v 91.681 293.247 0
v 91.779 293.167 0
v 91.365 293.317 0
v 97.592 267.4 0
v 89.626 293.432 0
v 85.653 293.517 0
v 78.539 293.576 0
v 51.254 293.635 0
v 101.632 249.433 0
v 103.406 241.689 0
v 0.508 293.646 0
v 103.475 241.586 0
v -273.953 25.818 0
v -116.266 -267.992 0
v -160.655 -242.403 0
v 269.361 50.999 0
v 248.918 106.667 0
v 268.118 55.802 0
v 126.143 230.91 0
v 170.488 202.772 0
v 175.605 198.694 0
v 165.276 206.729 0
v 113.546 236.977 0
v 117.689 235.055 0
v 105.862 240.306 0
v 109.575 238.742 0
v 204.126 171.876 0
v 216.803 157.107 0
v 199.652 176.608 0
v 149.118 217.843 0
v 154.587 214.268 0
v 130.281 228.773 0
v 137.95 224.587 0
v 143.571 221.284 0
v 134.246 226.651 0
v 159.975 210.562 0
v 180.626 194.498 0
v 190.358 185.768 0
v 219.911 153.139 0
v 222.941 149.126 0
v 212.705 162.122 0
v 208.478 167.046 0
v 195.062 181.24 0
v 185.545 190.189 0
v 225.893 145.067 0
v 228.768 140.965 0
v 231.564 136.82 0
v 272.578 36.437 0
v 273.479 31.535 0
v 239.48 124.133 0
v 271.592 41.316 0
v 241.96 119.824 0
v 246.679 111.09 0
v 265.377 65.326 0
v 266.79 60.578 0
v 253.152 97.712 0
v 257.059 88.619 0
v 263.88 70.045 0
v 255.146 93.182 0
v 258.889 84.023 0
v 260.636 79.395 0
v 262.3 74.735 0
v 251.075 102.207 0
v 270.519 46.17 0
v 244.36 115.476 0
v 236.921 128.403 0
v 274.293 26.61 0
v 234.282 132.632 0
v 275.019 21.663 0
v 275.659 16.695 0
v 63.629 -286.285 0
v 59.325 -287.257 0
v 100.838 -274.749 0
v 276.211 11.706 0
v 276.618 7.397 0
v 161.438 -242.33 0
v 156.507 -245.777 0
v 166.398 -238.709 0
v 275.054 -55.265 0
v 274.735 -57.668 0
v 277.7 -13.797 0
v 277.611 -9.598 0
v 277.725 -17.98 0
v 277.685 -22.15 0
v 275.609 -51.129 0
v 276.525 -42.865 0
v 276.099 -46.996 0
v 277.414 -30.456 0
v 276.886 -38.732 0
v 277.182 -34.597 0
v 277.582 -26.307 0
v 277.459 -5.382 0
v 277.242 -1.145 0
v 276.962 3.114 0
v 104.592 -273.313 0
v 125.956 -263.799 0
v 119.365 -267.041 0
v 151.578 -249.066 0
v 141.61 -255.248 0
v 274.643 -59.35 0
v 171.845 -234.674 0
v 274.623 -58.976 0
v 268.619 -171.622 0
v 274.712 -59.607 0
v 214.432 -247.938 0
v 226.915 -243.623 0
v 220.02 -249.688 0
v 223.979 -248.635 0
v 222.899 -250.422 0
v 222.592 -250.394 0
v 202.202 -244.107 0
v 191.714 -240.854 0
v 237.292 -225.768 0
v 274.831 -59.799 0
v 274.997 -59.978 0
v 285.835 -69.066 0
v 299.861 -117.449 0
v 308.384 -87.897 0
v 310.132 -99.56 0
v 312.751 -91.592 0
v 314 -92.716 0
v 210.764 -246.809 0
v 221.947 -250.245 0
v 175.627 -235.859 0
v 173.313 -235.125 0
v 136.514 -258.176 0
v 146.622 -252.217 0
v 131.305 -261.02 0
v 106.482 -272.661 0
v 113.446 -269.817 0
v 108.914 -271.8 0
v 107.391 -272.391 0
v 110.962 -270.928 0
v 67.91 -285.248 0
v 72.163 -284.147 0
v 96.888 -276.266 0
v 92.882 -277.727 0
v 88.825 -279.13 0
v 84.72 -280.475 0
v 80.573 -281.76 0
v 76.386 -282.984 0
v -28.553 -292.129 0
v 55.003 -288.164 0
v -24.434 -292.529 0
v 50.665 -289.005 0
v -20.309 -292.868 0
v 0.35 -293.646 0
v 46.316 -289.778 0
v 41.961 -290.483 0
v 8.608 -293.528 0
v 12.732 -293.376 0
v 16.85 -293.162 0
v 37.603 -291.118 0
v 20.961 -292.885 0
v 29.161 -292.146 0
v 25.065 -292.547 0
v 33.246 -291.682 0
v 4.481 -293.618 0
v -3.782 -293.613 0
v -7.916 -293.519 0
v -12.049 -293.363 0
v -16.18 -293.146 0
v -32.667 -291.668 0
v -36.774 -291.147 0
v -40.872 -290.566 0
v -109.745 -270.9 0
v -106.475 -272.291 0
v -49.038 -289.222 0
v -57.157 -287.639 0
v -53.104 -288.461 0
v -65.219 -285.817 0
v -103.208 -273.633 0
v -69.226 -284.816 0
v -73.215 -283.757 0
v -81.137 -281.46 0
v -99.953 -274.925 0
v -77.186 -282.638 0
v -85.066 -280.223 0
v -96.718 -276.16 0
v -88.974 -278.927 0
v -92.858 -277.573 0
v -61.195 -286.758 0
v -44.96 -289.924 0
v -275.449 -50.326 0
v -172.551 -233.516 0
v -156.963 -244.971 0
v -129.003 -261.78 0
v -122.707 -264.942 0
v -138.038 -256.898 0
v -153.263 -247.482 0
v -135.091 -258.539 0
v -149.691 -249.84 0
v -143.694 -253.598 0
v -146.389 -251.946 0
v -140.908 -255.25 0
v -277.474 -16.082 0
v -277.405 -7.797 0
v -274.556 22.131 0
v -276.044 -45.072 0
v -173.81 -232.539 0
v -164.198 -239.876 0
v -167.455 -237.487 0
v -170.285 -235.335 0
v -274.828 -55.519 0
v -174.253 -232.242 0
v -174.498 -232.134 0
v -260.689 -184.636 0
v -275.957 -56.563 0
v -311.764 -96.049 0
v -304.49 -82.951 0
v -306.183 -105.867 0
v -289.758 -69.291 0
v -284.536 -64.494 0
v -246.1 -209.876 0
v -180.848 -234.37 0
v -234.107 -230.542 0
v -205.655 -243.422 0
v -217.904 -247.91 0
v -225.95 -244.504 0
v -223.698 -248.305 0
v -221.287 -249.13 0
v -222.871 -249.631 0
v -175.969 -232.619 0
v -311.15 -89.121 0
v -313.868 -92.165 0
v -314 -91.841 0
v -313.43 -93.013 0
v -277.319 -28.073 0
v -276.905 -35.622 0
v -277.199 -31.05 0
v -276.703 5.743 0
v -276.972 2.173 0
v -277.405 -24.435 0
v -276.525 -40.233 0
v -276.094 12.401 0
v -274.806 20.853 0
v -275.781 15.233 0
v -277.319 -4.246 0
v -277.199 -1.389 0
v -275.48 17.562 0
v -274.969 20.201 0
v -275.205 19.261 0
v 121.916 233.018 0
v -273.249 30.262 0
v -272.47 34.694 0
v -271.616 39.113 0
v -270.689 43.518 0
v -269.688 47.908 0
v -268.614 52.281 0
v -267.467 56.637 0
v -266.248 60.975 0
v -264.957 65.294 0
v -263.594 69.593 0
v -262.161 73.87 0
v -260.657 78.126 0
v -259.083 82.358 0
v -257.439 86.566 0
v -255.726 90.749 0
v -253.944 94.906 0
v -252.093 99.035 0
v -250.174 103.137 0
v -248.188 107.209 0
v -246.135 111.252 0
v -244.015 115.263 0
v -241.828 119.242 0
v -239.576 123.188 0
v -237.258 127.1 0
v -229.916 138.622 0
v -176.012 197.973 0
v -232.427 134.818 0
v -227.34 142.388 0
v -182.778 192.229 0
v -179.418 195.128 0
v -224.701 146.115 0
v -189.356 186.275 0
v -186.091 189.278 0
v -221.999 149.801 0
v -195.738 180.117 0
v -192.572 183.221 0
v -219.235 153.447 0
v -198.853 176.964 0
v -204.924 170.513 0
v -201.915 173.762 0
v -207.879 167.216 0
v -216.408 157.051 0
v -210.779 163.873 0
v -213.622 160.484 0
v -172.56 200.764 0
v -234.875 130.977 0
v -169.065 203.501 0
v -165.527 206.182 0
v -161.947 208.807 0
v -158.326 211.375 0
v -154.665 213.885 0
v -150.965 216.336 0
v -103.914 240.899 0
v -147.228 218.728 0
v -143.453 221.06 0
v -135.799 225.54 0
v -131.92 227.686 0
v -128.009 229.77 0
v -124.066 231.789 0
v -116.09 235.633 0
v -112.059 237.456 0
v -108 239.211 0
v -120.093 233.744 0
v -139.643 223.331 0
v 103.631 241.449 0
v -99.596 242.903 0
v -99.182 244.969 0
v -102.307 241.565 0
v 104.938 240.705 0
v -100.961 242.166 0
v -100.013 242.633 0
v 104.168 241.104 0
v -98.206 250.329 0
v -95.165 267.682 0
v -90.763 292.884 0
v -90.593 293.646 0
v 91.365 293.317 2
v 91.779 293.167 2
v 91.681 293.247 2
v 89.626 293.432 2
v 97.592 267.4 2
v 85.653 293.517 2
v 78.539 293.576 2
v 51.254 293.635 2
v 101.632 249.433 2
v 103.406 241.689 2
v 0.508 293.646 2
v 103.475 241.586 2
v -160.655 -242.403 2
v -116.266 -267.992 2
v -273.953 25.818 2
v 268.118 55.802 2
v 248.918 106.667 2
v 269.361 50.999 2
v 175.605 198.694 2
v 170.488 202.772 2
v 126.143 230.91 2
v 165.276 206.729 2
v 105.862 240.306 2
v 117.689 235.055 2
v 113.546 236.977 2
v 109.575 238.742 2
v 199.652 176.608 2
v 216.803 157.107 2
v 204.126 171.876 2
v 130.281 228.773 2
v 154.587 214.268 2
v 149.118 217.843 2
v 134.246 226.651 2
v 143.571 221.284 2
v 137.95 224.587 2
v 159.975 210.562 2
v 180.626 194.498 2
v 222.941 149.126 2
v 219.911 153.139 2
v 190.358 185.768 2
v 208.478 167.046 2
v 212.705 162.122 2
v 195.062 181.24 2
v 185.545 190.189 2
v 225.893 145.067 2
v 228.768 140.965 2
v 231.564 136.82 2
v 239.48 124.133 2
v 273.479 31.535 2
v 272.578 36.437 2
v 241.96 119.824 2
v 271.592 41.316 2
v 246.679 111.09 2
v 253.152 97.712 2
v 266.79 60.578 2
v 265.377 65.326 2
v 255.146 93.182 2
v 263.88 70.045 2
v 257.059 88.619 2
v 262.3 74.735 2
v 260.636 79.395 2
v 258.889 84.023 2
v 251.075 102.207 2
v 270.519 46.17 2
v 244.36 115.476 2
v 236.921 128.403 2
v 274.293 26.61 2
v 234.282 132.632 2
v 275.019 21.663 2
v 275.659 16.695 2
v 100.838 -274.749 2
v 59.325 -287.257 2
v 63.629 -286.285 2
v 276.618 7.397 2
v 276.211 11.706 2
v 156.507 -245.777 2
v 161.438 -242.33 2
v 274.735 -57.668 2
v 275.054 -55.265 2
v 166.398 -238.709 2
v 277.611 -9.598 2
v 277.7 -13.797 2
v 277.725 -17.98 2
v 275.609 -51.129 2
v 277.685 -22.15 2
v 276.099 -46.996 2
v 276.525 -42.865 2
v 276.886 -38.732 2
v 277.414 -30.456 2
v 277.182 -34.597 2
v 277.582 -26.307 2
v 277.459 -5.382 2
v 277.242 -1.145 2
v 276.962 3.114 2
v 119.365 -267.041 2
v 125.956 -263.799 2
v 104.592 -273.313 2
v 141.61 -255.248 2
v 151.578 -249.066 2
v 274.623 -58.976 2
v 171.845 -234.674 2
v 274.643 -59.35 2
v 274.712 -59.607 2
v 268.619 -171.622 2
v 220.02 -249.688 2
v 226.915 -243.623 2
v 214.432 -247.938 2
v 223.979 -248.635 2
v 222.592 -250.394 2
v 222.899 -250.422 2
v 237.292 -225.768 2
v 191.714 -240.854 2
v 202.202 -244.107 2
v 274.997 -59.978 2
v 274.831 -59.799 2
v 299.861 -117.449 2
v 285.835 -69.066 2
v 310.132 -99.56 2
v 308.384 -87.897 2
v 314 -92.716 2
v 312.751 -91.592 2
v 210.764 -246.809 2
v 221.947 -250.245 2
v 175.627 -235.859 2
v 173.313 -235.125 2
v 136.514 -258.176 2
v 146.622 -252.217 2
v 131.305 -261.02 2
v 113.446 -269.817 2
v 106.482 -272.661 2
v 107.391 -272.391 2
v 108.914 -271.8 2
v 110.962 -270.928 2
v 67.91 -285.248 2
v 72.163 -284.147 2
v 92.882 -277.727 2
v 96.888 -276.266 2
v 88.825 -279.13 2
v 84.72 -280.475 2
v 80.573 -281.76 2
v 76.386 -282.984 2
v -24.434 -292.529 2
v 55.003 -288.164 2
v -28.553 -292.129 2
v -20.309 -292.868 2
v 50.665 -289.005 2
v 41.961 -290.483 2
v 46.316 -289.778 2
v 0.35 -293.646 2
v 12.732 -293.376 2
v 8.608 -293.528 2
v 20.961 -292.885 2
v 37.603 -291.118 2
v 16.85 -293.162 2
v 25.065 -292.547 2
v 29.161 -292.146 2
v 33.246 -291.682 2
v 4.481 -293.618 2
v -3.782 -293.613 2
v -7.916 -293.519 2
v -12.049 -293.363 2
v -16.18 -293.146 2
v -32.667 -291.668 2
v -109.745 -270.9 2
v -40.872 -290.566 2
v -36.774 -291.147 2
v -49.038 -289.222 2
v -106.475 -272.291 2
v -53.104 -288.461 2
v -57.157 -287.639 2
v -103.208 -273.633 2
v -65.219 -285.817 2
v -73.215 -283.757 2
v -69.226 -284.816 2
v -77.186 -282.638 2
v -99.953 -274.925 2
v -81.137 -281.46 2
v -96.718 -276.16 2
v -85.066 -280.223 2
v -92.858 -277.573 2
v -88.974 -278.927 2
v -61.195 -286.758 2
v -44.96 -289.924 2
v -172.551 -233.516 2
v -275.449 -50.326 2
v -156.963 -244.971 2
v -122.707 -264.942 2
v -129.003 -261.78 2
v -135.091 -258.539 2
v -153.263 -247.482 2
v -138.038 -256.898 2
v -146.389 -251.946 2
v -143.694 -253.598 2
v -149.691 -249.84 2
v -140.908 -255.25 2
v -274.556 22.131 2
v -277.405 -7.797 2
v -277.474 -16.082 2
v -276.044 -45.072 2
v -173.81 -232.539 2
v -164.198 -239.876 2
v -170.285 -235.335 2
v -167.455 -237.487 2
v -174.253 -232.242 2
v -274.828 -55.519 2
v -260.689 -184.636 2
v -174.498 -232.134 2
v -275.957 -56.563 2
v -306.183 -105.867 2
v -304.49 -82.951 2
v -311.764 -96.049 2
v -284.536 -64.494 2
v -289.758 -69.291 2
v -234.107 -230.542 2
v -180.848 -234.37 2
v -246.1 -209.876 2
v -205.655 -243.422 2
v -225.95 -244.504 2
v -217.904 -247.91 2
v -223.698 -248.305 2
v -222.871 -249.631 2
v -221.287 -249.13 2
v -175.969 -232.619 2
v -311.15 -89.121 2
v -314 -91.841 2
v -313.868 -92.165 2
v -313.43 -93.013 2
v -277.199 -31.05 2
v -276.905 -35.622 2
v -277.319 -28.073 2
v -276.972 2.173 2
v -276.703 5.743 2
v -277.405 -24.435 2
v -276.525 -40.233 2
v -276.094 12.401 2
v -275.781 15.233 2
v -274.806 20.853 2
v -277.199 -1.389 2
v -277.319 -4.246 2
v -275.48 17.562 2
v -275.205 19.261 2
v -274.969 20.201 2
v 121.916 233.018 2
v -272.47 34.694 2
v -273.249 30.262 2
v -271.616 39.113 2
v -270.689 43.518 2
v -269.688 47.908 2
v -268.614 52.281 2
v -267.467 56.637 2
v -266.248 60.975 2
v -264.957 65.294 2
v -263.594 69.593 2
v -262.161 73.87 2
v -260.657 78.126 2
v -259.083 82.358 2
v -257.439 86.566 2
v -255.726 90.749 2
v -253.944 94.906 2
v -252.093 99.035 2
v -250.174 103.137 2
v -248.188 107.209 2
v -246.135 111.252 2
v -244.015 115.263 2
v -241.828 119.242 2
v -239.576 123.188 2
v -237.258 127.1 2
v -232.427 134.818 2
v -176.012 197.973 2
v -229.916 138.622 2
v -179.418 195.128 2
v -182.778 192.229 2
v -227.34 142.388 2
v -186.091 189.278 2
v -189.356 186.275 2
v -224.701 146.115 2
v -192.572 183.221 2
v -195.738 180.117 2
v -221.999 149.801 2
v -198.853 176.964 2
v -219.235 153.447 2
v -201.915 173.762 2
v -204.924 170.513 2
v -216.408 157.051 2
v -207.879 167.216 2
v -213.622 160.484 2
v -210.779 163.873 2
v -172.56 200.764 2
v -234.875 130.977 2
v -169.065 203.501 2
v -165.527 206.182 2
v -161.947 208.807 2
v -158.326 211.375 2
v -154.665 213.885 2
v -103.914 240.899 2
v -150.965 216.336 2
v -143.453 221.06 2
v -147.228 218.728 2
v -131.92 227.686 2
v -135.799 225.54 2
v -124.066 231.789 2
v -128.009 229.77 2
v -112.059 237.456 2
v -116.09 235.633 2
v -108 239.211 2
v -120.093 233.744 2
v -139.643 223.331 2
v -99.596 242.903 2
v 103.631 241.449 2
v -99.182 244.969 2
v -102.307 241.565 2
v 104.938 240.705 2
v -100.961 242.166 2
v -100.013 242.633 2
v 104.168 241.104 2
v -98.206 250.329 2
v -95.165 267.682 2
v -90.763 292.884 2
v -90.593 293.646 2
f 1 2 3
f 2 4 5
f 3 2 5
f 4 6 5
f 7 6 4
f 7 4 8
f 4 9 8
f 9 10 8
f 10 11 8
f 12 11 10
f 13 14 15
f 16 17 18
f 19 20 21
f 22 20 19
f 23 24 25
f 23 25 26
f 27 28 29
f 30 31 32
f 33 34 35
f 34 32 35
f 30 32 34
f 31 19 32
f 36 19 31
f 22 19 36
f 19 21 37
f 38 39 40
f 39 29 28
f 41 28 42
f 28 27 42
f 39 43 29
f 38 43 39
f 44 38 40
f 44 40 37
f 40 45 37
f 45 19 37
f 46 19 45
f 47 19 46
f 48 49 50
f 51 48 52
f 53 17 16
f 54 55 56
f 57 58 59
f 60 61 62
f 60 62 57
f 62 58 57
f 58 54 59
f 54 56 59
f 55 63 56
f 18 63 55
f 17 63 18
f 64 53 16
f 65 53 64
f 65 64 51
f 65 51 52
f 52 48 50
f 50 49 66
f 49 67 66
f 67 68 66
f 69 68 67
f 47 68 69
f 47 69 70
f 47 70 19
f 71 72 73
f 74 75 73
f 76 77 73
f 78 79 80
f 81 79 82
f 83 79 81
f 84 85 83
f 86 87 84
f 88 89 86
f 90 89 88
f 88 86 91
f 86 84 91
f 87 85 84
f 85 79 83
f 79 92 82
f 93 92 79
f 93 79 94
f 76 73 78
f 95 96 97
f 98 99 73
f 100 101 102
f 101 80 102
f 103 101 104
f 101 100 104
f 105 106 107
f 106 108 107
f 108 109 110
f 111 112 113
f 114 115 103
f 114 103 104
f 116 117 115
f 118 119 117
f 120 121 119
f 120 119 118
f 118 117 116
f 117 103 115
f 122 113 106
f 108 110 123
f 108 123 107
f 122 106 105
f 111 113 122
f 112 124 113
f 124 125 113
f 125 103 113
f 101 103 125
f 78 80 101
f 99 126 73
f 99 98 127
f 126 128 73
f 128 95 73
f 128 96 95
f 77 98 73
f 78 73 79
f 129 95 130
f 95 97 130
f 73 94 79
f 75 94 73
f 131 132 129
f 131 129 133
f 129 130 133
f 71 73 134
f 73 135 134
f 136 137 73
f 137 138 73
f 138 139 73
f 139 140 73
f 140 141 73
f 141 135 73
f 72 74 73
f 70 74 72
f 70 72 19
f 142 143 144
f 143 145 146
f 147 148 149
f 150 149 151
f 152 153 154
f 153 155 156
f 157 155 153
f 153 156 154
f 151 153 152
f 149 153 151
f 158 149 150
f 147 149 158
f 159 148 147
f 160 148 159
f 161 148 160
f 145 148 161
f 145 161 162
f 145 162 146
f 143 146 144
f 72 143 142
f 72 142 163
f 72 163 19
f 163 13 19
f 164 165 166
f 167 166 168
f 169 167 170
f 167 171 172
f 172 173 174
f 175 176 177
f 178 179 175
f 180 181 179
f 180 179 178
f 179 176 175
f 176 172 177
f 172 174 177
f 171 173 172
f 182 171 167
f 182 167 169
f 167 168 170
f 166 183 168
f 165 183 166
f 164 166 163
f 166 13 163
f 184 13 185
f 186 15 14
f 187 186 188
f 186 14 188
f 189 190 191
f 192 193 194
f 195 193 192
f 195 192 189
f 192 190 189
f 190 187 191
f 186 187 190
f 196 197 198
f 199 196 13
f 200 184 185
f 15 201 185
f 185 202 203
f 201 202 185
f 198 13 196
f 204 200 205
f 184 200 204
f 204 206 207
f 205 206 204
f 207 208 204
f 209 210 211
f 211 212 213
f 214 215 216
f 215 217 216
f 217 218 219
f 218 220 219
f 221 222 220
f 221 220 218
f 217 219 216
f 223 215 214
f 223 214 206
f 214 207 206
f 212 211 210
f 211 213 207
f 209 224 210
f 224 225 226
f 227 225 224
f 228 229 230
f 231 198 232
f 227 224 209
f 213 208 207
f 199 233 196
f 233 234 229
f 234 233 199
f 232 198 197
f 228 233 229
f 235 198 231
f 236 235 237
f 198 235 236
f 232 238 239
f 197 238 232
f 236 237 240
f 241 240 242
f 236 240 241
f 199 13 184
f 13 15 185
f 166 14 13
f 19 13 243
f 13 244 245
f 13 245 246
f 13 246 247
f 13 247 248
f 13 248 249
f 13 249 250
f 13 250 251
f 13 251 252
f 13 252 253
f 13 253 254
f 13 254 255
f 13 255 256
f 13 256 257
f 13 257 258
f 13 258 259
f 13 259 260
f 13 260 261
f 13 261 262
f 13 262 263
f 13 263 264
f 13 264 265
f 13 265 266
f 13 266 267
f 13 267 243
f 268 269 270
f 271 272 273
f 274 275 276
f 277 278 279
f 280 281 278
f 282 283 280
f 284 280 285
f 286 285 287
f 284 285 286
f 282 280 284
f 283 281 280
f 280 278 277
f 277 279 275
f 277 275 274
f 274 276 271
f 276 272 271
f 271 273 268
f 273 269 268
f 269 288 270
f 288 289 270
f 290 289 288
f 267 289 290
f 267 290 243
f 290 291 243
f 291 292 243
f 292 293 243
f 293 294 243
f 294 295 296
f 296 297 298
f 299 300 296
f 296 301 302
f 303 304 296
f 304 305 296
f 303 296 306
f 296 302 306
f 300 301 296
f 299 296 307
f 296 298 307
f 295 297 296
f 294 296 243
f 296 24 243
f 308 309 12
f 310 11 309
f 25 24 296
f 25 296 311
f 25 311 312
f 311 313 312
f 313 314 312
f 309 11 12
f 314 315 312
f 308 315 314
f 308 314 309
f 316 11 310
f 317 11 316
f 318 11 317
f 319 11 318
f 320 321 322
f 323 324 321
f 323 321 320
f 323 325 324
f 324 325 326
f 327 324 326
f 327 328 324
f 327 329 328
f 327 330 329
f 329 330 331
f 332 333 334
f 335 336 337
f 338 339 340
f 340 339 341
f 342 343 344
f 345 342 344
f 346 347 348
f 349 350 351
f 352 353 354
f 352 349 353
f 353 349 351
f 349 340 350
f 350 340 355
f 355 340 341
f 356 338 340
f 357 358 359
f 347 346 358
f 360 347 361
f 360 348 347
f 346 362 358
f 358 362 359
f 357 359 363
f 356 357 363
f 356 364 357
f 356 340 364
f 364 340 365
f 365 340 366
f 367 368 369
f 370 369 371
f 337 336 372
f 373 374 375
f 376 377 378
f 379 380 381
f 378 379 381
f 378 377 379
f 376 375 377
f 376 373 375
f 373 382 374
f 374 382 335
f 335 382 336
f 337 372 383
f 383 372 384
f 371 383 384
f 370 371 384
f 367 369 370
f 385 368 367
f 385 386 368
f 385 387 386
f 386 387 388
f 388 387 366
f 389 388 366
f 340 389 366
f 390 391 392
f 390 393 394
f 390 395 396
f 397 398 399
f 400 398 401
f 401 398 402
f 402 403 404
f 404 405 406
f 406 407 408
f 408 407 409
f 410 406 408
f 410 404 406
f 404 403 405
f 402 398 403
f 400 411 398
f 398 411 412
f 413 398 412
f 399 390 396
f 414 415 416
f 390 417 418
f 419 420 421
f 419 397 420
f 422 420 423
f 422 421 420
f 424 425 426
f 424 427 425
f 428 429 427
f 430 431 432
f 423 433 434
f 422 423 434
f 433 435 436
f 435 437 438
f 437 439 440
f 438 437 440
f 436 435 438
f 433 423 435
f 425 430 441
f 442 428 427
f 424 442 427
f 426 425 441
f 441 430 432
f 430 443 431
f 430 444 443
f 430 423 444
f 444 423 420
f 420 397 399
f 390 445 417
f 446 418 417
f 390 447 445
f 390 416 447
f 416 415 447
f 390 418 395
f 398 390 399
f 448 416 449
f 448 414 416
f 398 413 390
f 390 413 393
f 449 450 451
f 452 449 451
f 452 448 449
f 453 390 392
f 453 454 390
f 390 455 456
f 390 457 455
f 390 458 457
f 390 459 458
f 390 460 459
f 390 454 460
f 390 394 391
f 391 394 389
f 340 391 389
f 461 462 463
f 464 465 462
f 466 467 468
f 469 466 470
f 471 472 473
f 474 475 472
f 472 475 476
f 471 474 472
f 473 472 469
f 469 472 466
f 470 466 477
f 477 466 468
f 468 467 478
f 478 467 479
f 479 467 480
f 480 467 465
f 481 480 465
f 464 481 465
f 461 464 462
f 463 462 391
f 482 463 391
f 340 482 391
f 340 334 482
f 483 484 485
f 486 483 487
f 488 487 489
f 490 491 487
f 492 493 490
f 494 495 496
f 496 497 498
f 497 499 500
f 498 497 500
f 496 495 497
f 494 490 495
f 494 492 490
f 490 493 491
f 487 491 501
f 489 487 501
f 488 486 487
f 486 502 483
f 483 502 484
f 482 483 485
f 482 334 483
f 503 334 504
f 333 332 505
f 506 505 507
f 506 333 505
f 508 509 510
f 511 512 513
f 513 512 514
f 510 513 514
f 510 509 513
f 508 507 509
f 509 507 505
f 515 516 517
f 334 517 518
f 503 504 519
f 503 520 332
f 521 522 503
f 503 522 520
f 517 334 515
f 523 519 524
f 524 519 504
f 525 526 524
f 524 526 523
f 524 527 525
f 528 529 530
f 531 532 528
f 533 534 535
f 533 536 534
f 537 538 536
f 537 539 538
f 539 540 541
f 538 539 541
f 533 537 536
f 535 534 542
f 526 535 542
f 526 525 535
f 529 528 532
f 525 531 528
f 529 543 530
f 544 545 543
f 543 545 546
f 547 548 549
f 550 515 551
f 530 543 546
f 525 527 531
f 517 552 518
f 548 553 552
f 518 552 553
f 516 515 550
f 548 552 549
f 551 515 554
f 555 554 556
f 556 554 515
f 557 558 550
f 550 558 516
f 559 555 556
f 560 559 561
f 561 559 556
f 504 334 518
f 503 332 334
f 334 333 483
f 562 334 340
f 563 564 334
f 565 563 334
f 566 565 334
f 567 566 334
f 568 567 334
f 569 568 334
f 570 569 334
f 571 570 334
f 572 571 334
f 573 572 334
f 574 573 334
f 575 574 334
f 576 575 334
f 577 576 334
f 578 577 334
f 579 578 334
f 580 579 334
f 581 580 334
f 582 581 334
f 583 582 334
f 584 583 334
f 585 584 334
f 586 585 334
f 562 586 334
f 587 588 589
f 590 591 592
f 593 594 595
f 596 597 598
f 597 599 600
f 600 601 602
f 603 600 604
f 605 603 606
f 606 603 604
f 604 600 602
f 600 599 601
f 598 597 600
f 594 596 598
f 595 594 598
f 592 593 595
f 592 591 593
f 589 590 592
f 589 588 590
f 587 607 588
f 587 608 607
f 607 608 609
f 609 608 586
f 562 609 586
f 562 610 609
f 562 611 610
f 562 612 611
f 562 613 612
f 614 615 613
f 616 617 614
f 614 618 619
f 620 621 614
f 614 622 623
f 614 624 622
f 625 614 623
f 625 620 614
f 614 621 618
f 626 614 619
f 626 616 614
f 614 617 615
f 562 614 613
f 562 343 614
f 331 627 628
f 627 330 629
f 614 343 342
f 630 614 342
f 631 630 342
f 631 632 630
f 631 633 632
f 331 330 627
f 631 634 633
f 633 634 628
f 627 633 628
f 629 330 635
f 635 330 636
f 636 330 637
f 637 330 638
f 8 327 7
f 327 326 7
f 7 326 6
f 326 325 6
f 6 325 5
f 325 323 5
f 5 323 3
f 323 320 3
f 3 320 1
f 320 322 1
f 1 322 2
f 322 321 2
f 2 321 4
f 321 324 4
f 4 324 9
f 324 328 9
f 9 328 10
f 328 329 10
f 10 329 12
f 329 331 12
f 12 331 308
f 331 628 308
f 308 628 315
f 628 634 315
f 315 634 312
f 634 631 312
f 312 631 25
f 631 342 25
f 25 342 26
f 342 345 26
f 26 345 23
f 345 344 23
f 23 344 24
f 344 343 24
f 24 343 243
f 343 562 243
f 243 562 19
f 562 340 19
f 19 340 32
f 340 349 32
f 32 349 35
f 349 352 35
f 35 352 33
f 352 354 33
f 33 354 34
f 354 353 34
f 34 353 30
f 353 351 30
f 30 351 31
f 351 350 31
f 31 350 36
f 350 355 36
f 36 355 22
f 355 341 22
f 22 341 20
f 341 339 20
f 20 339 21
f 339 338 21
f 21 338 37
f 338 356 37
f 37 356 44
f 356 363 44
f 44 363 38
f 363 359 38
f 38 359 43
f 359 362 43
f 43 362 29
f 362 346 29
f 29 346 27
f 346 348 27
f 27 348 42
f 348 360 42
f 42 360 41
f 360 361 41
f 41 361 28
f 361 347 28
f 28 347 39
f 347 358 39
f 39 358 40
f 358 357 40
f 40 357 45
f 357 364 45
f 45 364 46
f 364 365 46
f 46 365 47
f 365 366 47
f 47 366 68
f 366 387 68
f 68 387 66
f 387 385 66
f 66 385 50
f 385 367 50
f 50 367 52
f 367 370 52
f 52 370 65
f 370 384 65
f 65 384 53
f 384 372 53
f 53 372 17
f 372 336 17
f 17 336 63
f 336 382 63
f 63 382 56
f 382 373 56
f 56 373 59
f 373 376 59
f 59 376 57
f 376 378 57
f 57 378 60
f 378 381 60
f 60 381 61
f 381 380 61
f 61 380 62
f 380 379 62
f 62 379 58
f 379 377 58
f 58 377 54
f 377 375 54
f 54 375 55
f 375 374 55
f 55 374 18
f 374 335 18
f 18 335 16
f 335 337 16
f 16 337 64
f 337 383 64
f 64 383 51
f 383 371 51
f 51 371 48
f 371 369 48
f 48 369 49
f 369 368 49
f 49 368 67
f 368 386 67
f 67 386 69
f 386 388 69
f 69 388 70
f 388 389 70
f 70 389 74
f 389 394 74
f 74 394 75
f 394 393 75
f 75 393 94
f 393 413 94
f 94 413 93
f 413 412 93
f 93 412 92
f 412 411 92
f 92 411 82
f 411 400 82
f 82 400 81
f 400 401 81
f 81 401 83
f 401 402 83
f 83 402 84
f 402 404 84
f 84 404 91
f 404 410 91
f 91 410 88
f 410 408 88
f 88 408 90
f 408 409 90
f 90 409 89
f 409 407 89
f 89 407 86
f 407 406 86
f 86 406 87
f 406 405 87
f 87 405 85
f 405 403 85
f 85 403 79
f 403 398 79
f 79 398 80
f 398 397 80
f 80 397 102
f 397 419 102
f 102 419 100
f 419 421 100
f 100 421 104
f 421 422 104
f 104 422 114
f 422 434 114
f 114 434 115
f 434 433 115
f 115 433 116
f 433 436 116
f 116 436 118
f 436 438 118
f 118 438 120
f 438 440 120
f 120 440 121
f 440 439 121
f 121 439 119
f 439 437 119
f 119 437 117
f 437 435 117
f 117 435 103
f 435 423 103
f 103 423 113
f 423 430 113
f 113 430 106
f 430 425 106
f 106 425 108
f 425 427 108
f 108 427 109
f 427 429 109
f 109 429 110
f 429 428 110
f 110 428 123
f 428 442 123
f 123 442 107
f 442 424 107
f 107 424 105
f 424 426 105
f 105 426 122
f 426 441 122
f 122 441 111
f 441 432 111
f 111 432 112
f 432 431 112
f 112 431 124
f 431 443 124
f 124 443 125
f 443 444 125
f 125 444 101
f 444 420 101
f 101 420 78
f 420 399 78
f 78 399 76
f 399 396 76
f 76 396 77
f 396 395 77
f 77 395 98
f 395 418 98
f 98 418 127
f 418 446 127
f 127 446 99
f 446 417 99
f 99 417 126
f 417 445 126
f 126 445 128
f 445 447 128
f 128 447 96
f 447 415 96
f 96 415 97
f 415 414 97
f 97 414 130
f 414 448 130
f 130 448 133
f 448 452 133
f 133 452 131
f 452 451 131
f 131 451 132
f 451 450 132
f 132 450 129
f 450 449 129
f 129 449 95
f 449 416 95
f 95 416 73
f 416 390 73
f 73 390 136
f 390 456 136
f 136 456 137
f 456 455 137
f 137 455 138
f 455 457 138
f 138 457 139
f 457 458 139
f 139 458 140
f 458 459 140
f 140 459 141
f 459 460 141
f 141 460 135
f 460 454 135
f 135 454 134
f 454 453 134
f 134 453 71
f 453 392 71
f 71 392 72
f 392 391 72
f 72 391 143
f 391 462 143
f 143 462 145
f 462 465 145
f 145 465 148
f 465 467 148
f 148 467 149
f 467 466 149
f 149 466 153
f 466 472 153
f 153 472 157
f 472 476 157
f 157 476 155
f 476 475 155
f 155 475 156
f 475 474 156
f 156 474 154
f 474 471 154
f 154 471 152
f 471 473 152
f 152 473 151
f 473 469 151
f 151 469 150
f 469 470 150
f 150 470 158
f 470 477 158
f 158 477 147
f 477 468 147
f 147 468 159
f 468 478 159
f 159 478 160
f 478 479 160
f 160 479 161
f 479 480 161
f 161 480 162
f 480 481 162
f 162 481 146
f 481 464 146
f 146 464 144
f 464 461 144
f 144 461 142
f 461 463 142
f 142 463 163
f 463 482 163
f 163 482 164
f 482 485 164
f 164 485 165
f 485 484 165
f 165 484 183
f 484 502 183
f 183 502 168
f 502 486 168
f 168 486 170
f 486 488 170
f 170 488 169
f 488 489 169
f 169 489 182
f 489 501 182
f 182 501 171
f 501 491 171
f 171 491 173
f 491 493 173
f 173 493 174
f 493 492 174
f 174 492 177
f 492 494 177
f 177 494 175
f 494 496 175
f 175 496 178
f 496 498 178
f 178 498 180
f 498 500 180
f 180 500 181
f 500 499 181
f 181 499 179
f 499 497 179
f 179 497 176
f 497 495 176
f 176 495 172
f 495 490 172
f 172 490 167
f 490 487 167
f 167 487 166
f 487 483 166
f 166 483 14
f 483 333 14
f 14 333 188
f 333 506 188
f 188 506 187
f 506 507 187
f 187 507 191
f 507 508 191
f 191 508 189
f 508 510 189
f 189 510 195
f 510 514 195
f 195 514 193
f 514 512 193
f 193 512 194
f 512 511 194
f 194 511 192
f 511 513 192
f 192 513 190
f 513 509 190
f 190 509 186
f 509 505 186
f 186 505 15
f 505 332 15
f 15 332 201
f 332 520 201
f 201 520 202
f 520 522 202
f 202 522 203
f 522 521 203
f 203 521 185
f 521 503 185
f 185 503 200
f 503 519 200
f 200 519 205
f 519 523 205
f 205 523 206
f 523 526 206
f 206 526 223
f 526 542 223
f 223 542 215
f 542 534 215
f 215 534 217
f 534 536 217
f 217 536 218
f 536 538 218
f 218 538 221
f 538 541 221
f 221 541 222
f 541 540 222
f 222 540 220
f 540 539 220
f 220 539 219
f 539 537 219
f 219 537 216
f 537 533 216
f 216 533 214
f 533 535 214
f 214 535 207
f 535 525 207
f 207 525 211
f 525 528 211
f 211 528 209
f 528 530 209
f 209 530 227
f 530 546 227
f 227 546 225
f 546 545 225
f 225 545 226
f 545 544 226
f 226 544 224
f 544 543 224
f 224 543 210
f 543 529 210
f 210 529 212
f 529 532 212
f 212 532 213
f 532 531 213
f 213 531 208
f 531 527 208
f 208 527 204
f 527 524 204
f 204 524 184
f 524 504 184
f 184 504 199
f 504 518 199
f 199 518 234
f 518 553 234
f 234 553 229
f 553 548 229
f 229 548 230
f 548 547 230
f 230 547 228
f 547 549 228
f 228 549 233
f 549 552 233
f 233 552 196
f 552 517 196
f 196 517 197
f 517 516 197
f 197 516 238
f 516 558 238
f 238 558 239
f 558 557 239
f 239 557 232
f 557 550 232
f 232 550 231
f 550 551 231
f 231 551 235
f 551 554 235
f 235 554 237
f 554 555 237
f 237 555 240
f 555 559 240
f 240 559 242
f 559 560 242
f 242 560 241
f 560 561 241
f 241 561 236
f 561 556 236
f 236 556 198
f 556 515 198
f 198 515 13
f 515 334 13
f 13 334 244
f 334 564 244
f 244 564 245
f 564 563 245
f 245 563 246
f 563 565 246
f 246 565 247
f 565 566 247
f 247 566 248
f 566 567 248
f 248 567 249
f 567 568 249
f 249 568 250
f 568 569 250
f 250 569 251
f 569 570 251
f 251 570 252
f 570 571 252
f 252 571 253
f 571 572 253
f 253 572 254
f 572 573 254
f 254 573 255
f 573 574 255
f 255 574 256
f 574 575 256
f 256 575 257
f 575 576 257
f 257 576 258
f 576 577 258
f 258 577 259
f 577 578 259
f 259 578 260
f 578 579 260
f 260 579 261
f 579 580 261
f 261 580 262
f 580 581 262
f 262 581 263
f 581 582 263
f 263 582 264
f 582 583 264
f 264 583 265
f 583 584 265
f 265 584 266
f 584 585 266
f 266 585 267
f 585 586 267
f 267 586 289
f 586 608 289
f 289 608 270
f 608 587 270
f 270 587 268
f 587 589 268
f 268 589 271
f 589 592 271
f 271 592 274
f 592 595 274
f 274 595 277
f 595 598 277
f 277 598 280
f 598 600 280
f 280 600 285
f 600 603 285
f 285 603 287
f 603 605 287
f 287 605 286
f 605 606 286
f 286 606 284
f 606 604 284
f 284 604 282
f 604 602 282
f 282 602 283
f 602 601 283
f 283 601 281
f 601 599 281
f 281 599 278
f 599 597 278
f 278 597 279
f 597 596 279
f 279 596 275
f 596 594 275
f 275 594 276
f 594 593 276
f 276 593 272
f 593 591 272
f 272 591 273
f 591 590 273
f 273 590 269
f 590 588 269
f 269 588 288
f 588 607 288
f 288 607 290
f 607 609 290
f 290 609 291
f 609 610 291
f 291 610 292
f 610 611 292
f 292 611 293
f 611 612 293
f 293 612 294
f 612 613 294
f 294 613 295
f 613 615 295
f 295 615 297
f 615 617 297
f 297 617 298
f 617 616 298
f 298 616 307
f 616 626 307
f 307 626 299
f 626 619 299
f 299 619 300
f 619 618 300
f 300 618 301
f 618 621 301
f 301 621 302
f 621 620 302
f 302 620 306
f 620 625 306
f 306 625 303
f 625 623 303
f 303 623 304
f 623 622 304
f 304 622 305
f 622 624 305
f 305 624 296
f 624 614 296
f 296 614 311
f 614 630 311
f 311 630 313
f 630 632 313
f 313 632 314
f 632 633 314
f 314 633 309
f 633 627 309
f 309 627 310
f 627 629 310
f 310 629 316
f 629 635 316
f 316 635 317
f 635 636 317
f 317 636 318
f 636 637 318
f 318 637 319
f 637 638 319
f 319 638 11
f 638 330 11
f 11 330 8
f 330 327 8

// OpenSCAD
// Module names are of the form poly_<inkscape-path-id>().
// As a result you can associate a polygon in this OpenSCAD program with the
//  corresponding SVG element in the Inkscape document by looking for 
//  the XML element with the attribute id="inkscape-path-id".

// Paths have their own variables so they can be imported and used 
//  in polygon(points) structures in other programs.
// The NN_points is the list of all polygon XY vertices. 
// There may be an NN_paths variable as well. If it exists then it 
//  defines the nested paths. Both must be used in the 
//  polygon(points, paths) variant of the command.

profile_scale = 25.4/90; //made in inkscape in mm

// helper functions to determine the X,Y dimensions of the profiles
function min_x(shape_points) = min([ for (x = shape_points) min(x[0])]);
function max_x(shape_points) = max([ for (x = shape_points) max(x[0])]);
function min_y(shape_points) = min([ for (x = shape_points) min(x[1])]);
function max_y(shape_points) = max([ for (x = shape_points) max(x[1])]);

height = 2;
width = 1.0;


path4_0_points = [[-321.600000,-1037.779688],[-337.200000,-948.479687],[-347.975000,-886.992188],[-351.431250,-868.000000],[-352.900000,-860.679688],[-354.376562,-859.725000],[-357.737500,-858.067188],[-362.504688,-855.940625],[-368.200000,-853.579687],[-382.676151,-847.599185],[-397.058423,-841.378247],[-411.343173,-834.919601],[-425.526758,-828.225977],[-439.605533,-821.300101],[-453.575854,-814.144702],[-467.434079,-806.762509],[-481.176563,-799.156250],[-494.799661,-791.328653],[-508.299731,-783.282446],[-521.673129,-775.020358],[-534.916211,-766.545117],[-548.025333,-757.859451],[-560.996851,-748.966089],[-573.827121,-739.867758],[-586.512500,-730.567187],[-599.049344,-721.067105],[-611.434009,-711.370239],[-623.662851,-701.479318],[-635.732227,-691.397070],[-647.638492,-681.126224],[-659.378003,-670.669507],[-670.947116,-660.029648],[-682.342188,-649.209375],[-693.559573,-638.211417],[-704.595630,-627.038501],[-715.446713,-615.693356],[-726.109180,-604.178711],[-736.579385,-592.497293],[-746.853687,-580.651831],[-756.928439,-568.645053],[-766.800000,-556.479687],[-776.815472,-543.710352],[-786.610889,-530.792187],[-796.184747,-517.728711],[-805.535547,-504.523438],[-814.661786,-491.179883],[-823.561963,-477.701563],[-832.234576,-464.091992],[-840.678125,-450.354687],[-848.891107,-436.493164],[-856.872021,-422.510937],[-864.619366,-408.411523],[-872.131641,-394.198437],[-879.407343,-379.875195],[-886.444971,-365.445312],[-893.243024,-350.912305],[-899.800000,-336.279688],[-906.114398,-321.550977],[-912.184717,-306.729687],[-918.009454,-291.819336],[-923.587109,-276.823437],[-928.916180,-261.745508],[-933.995166,-246.589062],[-938.822565,-231.357617],[-943.396875,-216.054688],[-947.716595,-200.683789],[-951.780225,-185.248438],[-955.586261,-169.752148],[-959.133203,-154.198437],[-962.419550,-138.590820],[-965.443799,-122.932812],[-968.204449,-107.227930],[-970.700000,-91.479687],[-972.837500,-78.417187],[-973.723438,-73.887500],[-974.300000,-71.579688],[-975.135742,-68.247461],[-976.110938,-62.228125],[-977.177539,-53.975195],[-978.287500,-43.942188],[-980.445312,-20.350000],[-981.397070,-7.697852],[-982.200000,4.920312],[-982.626563,15.043164],[-982.931250,27.628125],[-983.175000,56.982812],[-982.931250,86.581250],[-982.626563,99.470898],[-982.200000,110.020313],[-981.160938,126.218750],[-979.812500,142.557812],[-978.107813,159.703125],[-976.000000,178.320312],[-973.800000,196.720313],[-977.800000,200.420312],[-1008.200000,228.520313],[-1026.700000,245.520313],[-1078.900000,293.920313],[-1102.500000,315.782812],[-1112.600000,325.420313],[-1112.131641,326.567383],[-1110.578125,329.571875],[-1104.675000,340.332813],[-1084.900000,375.120312],[-923.700000,654.220312],[-872.007812,743.656250],[-829.512500,816.882812],[-800.610938,866.353125],[-792.631836,879.821289],[-789.700000,884.520313],[-784.087500,882.745312],[-772.100000,878.420313],[-728.700000,862.520313],[-640.800000,830.445313],[-623.512500,824.242188],[-618.300000,822.520313],[-617.432812,822.906250],[-615.862500,823.957813],[-611.400000,827.420313],[-603.372656,833.864258],[-593.343750,841.490625],[-581.805469,849.953711],[-569.250000,858.907813],[-556.169531,868.007227],[-543.056250,876.906250],[-530.402344,885.259180],[-518.700000,892.720313],[-509.152759,898.575000],[-499.279883,904.429688],[-489.109644,910.270313],[-478.670313,916.082813],[-457.097461,927.567188],[-434.787500,938.770313],[-411.966602,949.579688],[-388.860938,959.882813],[-377.271997,964.809375],[-365.696680,969.567188],[-354.163257,974.142187],[-342.700000,978.520313],[-329.024017,983.526190],[-315.261279,988.324756],[-301.415851,992.915533],[-287.491797,997.298047],[-273.493182,1001.471820],[-259.424072,1005.436377],[-245.288531,1009.191241],[-231.090625,1012.735937],[-216.834418,1016.069989],[-202.523975,1019.192920],[-188.163361,1022.104254],[-173.756641,1024.803516],[-159.307880,1027.290228],[-144.821143,1029.563916],[-130.300494,1031.624103],[-115.750000,1033.470312],[-101.173724,1035.102069],[-86.575732,1036.518896],[-71.960089,1037.720319],[-57.330859,1038.705859],[-42.692108,1039.475043],[-28.047900,1040.027393],[-13.402301,1040.362433],[1.240625,1040.479687],[15.876813,1040.378680],[30.502197,1040.058936],[45.112714,1039.519977],[59.704297,1038.761328],[74.272882,1037.782513],[88.814404,1036.583057],[103.324799,1035.162482],[117.800000,1033.520313],[133.238232,1031.519336],[148.680859,1029.268750],[164.113525,1026.772070],[179.521875,1024.032812],[194.891553,1021.054492],[210.208203,1017.840625],[225.457471,1014.394727],[240.625000,1010.720312],[255.696436,1006.820898],[270.657422,1002.700000],[285.493604,998.361133],[300.190625,993.807812],[314.734131,989.043555],[329.109766,984.071875],[343.303174,978.896289],[357.300000,973.520313],[370.600000,968.432812],[377.300000,966.120312],[380.519141,965.164844],[385.915625,963.070312],[393.173047,959.982031],[401.975000,956.045312],[422.946875,946.207812],[446.300000,934.720312],[465.254297,924.875195],[483.709375,914.796875],[501.766016,904.420898],[519.525000,893.682812],[537.087109,882.518164],[554.553125,870.862500],[572.023828,858.651367],[589.600000,845.820312],[608.900000,831.520313],[614.100000,833.120312],[622.300000,835.720313],[679.300000,853.420313],[716.462500,864.945313],[746.800000,874.520313],[759.800000,878.520313],[779.600000,884.720313],[786.425000,886.695313],[788.712500,887.223438],[789.800000,887.320312],[793.627344,880.988696],[804.031250,863.231445],[840.800000,799.965625],[951.800000,608.107813],[1062.500000,416.156250],[1098.893750,352.773242],[1112.600000,328.520313],[1108.171875,324.539062],[1092.700000,311.445312],[1012.800000,244.720312],[974.400000,212.520313],[973.809766,211.884766],[973.390625,211.204687],[973.144922,210.294922],[973.075000,208.970312],[973.471875,204.335937],[974.600000,195.820312],[976.566455,181.165942],[978.303516,166.522852],[979.811475,151.883569],[981.090625,137.240625],[982.141260,122.586548],[982.963672,107.913867],[983.558154,93.215112],[983.925000,78.482813],[984.064502,63.709497],[983.976953,48.887695],[983.662646,34.009937],[983.121875,19.068750],[982.354932,4.056665],[981.362109,-11.033789],[980.143701,-26.210083],[978.700000,-41.479687],[976.744345,-59.154285],[974.478198,-76.757324],[971.902786,-94.285803],[969.019336,-111.736719],[965.829074,-129.107068],[962.333228,-146.393848],[958.533023,-163.594055],[954.429688,-180.704687],[950.024448,-197.722742],[945.318530,-214.645215],[940.313162,-231.469104],[935.009570,-248.191406],[929.408981,-264.809119],[923.512622,-281.319238],[917.321719,-297.718762],[910.837500,-314.004688],[904.061191,-330.174011],[896.994019,-346.223730],[889.637210,-362.150842],[881.991992,-377.952344],[874.059592,-393.625232],[865.841235,-409.166504],[857.338150,-424.573157],[848.551563,-439.842188],[839.482700,-454.970593],[830.132788,-469.955371],[820.503055,-484.793518],[810.594727,-499.482031],[800.409030,-514.017908],[789.947192,-528.398145],[779.210440,-542.619739],[768.200000,-556.679688],[753.679272,-574.448022],[738.701367,-591.895117],[723.280200,-609.009106],[707.429688,-625.778125],[691.163745,-642.190308],[674.496289,-658.233789],[657.441235,-673.896704],[640.012500,-689.167188],[622.223999,-704.033374],[604.089648,-718.483398],[585.623364,-732.505396],[566.839062,-746.087500],[547.750659,-759.217847],[528.372070,-771.884570],[508.717212,-784.075806],[488.800000,-795.779688],[475.674414,-803.094922],[461.626562,-810.614063],[446.962305,-818.184766],[431.987500,-825.654688],[417.008008,-832.871484],[402.329687,-839.682812],[388.258398,-845.936328],[375.100000,-851.479687],[371.828125,-852.892188],[369.100000,-854.304688],[367.196875,-855.529687],[366.642578,-856.013281],[366.400000,-856.379688],[360.112500,-883.817188],[345.800000,-947.479687],[325.200000,-1038.779688],[324.854077,-1039.062451],[323.735742,-1039.312109],[317.573437,-1039.720313],[303.496289,-1040.020703],[278.287500,-1040.229687],[181.607813,-1040.439063],[1.800000,-1040.479687],[-321.000000,-1040.479687],[-321.600000,-1037.779688]];

module poly_path4(h, w, res=4)  {
  scale([profile_scale, -profile_scale, 1])
  union()  {
    linear_extrude(height=h)
      polygon(path4_0_points);
  }
}

// The shapes
poly_path4(height, width);
